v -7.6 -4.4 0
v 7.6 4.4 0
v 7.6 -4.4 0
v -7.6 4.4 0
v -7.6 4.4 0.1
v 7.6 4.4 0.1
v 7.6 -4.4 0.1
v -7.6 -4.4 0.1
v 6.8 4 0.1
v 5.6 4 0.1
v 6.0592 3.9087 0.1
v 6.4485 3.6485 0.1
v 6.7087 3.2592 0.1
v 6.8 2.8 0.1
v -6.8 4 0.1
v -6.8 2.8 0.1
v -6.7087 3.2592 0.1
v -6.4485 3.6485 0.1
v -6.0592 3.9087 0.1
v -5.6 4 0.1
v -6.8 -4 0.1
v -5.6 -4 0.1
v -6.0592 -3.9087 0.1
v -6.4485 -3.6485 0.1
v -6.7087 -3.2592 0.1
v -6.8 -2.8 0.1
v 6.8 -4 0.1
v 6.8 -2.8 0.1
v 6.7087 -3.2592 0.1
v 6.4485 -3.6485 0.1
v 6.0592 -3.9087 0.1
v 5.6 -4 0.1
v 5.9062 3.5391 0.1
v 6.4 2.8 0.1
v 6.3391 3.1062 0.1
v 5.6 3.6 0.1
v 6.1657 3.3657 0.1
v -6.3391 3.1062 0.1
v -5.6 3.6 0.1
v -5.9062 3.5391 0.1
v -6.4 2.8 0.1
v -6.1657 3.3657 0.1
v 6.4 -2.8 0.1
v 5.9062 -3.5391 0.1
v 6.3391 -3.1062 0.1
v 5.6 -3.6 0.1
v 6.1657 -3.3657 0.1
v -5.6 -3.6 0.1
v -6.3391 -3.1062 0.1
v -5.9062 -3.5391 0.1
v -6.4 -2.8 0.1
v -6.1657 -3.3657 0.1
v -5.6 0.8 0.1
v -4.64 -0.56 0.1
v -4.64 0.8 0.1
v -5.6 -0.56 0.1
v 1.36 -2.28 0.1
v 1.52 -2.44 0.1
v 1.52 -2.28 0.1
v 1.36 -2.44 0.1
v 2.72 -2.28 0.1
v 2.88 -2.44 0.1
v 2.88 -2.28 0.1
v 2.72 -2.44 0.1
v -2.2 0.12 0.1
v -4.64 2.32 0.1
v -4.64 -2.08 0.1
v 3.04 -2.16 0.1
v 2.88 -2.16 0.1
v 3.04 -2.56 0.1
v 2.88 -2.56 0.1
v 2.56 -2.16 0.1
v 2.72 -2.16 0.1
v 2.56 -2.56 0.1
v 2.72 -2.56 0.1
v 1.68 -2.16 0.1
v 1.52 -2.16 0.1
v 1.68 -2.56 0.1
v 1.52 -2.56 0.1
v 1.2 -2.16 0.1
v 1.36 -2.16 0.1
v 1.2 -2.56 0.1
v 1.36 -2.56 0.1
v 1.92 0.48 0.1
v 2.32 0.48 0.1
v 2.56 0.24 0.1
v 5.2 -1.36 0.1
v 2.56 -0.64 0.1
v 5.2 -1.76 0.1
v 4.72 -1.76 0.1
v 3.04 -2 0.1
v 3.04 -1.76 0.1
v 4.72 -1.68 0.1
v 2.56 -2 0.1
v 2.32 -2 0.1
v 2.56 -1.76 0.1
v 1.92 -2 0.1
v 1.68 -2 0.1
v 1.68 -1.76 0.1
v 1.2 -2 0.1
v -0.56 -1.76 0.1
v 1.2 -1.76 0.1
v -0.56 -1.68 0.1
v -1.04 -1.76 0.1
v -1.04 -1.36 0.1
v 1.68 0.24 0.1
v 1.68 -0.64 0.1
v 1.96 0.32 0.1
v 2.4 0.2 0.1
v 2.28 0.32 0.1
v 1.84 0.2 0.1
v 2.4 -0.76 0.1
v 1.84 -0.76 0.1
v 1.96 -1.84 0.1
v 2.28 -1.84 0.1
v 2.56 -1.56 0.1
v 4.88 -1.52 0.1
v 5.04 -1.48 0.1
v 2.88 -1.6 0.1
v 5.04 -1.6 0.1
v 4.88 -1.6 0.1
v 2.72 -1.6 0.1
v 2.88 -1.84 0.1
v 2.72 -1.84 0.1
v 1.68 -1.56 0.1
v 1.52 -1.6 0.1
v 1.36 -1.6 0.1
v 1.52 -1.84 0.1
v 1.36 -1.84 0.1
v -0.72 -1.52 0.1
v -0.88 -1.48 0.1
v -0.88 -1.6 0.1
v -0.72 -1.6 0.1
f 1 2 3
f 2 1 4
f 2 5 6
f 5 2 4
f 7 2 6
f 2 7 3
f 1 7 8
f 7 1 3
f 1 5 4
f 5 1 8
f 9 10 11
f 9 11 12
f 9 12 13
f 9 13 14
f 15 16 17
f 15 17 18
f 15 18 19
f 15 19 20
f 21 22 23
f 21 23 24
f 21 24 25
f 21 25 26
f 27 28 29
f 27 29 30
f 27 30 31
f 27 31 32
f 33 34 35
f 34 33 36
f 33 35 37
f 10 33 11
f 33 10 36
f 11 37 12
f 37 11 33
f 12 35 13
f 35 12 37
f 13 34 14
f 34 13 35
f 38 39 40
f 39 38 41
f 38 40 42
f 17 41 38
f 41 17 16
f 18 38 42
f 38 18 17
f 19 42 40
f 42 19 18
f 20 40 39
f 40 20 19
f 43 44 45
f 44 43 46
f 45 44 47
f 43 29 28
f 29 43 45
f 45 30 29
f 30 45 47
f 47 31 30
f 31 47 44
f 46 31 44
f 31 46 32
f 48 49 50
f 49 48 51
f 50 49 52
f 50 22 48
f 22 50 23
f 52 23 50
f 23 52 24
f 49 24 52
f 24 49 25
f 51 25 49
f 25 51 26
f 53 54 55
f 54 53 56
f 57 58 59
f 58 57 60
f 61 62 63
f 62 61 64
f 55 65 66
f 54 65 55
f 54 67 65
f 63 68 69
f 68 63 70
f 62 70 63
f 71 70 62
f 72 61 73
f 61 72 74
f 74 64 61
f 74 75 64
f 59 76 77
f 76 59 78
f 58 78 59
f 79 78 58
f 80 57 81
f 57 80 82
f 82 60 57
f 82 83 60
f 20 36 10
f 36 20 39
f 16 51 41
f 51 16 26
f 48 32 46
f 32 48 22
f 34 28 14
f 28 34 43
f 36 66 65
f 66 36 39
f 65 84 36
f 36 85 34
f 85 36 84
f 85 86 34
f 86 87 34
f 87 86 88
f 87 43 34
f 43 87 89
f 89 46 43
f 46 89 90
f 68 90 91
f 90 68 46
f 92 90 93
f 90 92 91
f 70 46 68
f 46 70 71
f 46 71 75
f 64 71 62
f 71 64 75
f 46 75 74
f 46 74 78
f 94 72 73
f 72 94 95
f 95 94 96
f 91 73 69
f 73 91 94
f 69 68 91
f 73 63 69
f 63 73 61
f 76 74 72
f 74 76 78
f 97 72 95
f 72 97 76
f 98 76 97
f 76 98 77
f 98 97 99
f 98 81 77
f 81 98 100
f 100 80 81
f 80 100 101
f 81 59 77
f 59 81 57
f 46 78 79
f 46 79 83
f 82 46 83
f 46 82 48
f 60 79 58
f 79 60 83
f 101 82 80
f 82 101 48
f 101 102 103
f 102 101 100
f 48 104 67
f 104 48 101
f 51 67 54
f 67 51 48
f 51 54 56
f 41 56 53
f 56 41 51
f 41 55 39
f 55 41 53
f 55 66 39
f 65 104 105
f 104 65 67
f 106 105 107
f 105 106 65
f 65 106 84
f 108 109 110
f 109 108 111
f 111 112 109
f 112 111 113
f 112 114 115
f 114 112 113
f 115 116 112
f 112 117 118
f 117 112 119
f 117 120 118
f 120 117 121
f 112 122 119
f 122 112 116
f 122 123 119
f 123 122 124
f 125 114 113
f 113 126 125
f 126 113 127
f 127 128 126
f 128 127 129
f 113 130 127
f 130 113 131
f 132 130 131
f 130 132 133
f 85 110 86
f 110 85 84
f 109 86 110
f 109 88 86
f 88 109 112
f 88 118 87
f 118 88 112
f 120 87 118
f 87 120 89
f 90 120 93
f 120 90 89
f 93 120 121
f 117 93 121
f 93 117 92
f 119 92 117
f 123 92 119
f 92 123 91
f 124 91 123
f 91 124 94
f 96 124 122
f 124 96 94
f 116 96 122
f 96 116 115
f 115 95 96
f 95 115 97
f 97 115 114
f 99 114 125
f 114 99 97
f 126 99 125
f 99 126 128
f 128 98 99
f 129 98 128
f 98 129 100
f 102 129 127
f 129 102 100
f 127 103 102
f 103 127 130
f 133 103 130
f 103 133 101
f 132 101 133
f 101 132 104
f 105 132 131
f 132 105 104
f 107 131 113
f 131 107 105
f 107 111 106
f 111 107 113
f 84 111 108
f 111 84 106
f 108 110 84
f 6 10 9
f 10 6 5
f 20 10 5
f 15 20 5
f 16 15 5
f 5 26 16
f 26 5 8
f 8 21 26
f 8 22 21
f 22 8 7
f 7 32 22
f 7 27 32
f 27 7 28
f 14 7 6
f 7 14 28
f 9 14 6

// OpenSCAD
// file: ../p/box5-12.scad
use <../lib.scad>
function ldraw_lib__box5_12() = [
// 0 Box with 5 Faces without Any Edges
// 0 Name: box5-12.dat
// 0 Author: Chris Dee [cwdee]
// 0 !LDRAW_ORG Primitive UPDATE 2009-02
// 0 !LICENSE Licensed under CC BY 4.0 : see CAreadme.txt
// 
// 0 BFC CERTIFY CCW
  [0,"BFC","CERTIFY"],
  [0,"BFC","CCW"],
// 
// 0 !HISTORY 2009-09-03 [PTadmin] Official Update 2009-02
// 
// 
// 4 16 1 1 1 1 1 -1 -1 1 -1 -1 1 1
  [4,16,1,1,1,1,1,-1,-1,1,-1,-1,1,1],
// 4 16 -1 0 1 1 0 1 1 1 1 -1 1 1
  [4,16,-1,0,1,1,0,1,1,1,1,-1,1,1],
// 4 16 -1 0 -1 -1 0 1 -1 1 1 -1 1 -1
  [4,16,-1,0,-1,-1,0,1,-1,1,1,-1,1,-1],
// 4 16 1 0 -1 -1 0 -1 -1 1 -1 1 1 -1
  [4,16,1,0,-1,-1,0,-1,-1,1,-1,1,1,-1],
// 4 16 1 0 1 1 0 -1 1 1 -1 1 1 1
  [4,16,1,0,1,1,0,-1,1,1,-1,1,1,1],
// 0
];
module ldraw_lib__box5_12(step=0, col=false, unit=2/5, alt=false, line=0.2, solid=!$preview)
    makepoly(ldraw_lib__box5_12(), step=step, col=col, unit=unit, alt=alt, line=line, solid=solid);
ldraw_lib__box5_12(line=0.2);
// file: ../p/1-4ring2.scad
use <../lib.scad>
function ldraw_lib__1_4ring2() = [
// 0 Ring  2 x 0.25
// 0 Name: 1-4ring2.dat
// 0 Author: Franklin W. Cain [fwcain]
// 0 !LDRAW_ORG Primitive UPDATE 2015-01
// 0 !LICENSE Licensed under CC BY 2.0 and CC BY 4.0 : see CAreadme.txt
// 
// 0 BFC CERTIFY CCW
  [0,"BFC","CERTIFY"],
  [0,"BFC","CCW"],
// 
// 0 !HISTORY 2001-12-31 [PTadmin] Official Update 2001-03
// 0 !HISTORY 2007-06-22 [PTadmin] Header formatted for Contributor Agreement
// 0 !HISTORY 2008-07-01 [PTadmin] Official Update 2008-01
// 0 !HISTORY 2012-02-16 [Philo] Changed to CCW
// 0 !HISTORY 2012-03-30 [PTadmin] Official Update 2012-01
// 0 !HISTORY 2014-12-25 [MMR1988] Fixed a rounding issue
// 0 !HISTORY 2015-10-11 [PTadmin] Official Update 2015-01
// 
// 
// 4 16 3 0 0 2.7717 0 1.1481 1.8478 0 0.7654 2 0 0
  [4,16,3,0,0,2.7717,0,1.1481,1.8478,0,0.7654,2,0,0],
// 4 16 2.7717 0 1.1481 2.1213 0 2.1213 1.4142 0 1.4142 1.8478 0 0.7654
  [4,16,2.7717,0,1.1481,2.1213,0,2.1213,1.4142,0,1.4142,1.8478,0,0.7654],
// 4 16 2.1213 0 2.1213 1.1481 0 2.7717 0.7654 0 1.8478 1.4142 0 1.4142
  [4,16,2.1213,0,2.1213,1.1481,0,2.7717,0.7654,0,1.8478,1.4142,0,1.4142],
// 4 16 1.1481 0 2.7717 0 0 3 0 0 2 0.7654 0 1.8478
  [4,16,1.1481,0,2.7717,0,0,3,0,0,2,0.7654,0,1.8478],
// 0 // Build by Primitive Generator 2
];
module ldraw_lib__1_4ring2(step=0, col=false, unit=2/5, alt=false, line=0.2, solid=!$preview)
    makepoly(ldraw_lib__1_4ring2(), step=step, col=col, unit=unit, alt=alt, line=line, solid=solid);
ldraw_lib__1_4ring2(line=0.2);
// file: ../p/1-4ndis.scad
use <../lib.scad>
function ldraw_lib__1_4ndis() = [
// 0 Disc Negative 0.25
// 0 Name: 1-4ndis.dat
// 0 Author: James Jessiman
// 0 !LDRAW_ORG Primitive UPDATE 2012-01
// 0 !LICENSE Licensed under CC BY 4.0 : see CAreadme.txt
// 
// 0 BFC CERTIFY CCW
  [0,"BFC","CERTIFY"],
  [0,"BFC","CCW"],
// 
// 0 !HISTORY 2002-03-23 [sbliss] Added BFC Statement
// 0 !HISTORY 2002-04-25 [PTadmin] Official Update 2002-02
// 0 !HISTORY 2007-06-22 [PTadmin] Header formatted for Contributor Agreement
// 0 !HISTORY 2008-07-01 [PTadmin] Official Update 2008-01
// 0 !HISTORY 2012-02-16 [Philo] Changed to CCW
// 0 !HISTORY 2012-03-30 [PTadmin] Official Update 2012-01
// 
// 
// 3 16 0.9239 0 0.3827 1 0 0 1 0 1
  [3,16,0.9239,0,0.3827,1,0,0,1,0,1],
// 3 16 0.7071 0 0.7071 0.9239 0 0.3827 1 0 1
  [3,16,0.7071,0,0.7071,0.9239,0,0.3827,1,0,1],
// 3 16 0.3827 0 0.9239 0.7071 0 0.7071 1 0 1
  [3,16,0.3827,0,0.9239,0.7071,0,0.7071,1,0,1],
// 3 16 0 0 1 0.3827 0 0.9239 1 0 1
  [3,16,0,0,1,0.3827,0,0.9239,1,0,1],
];
module ldraw_lib__1_4ndis(step=0, col=false, unit=2/5, alt=false, line=0.2, solid=!$preview)
    makepoly(ldraw_lib__1_4ndis(), step=step, col=col, unit=unit, alt=alt, line=line, solid=solid);
ldraw_lib__1_4ndis(line=0.2);
// file: ../p/1-4chrd.scad
use <../lib.scad>
function ldraw_lib__1_4chrd() = [
// 0 Chord 0.25
// 0 Name: 1-4chrd.dat
// 0 Author: Tony Hafner [hafhead]
// 0 !LDRAW_ORG Primitive UPDATE 2012-02
// 0 !LICENSE Licensed under CC BY 2.0 and CC BY 4.0 : see CAreadme.txt
// 
// 0 BFC CERTIFY CCW
  [0,"BFC","CERTIFY"],
  [0,"BFC","CCW"],
// 
// 0 !HISTORY 2004-04-22 [PTadmin] Official Update 2004-02
// 0 !HISTORY 2007-10-09 [PTadmin] Header formatted for Contributor Agreement
// 0 !HISTORY 2008-07-01 [PTadmin] Official Update 2008-01
// 0 !HISTORY 2012-08-02 [MMR1988] Re-creation with PrimGen2 and Rectifier
// 0 !HISTORY 2012-08-09 [PTadmin] Official Update 2012-02
// 
// 
// 4 16 0.9239 0 0.3827 0.3827 0 0.9239 0 0 1 1 0 0
  [4,16,0.9239,0,0.3827,0.3827,0,0.9239,0,0,1,1,0,0],
// 3 16 0.7071 0 0.7071 0.3827 0 0.9239 0.9239 0 0.3827
  [3,16,0.7071,0,0.7071,0.3827,0,0.9239,0.9239,0,0.3827],
];
module ldraw_lib__1_4chrd(step=0, col=false, unit=2/5, alt=false, line=0.2, solid=!$preview)
    makepoly(ldraw_lib__1_4chrd(), step=step, col=col, unit=unit, alt=alt, line=line, solid=solid);
ldraw_lib__1_4chrd(line=0.2);
// main file
use <../lib.scad>
use <163555j.scad>
function ldraw_lib__163555k() = [
// 0 Sticker  1.1 x  1.9 with Airport Direction Sign - Right
// 0 Name: 163555k.dat
// 0 Author: Takeshi Takahashi [RainbowDolphin]
// 0 !LDRAW_ORG Part UPDATE 2022-05
// 0 !LICENSE Licensed under CC BY 4.0 : see CAreadme.txt
// 
// 0 BFC CERTIFY CCW
  [0,"BFC","CERTIFY"],
  [0,"BFC","CCW"],
// 
// 0 !KEYWORDS Bricklink 6399stk01, Brickowl 458337, Monorail, Rebrickable 163555
// 0 !KEYWORDS set 6399, Station
// 
// 0 !HISTORY 2022-09-15 [PTadmin] Official Update 2022-05
// 
// 
// 1 16 0 0 0 -1 0 0 0 1 0 0 0 1 163555j.dat
  [1,16,0,0,0,-1,0,0,0,1,0,0,0,1, ldraw_lib__163555j()],
];
module ldraw_lib__163555k(step=0, col=false, unit=2/5, alt=false, line=0.2, solid=!$preview)
    makepoly(ldraw_lib__163555k(), step=step, col=col, unit=unit, alt=alt, line=line, solid=solid);
ldraw_lib__163555k(line=0.2);
